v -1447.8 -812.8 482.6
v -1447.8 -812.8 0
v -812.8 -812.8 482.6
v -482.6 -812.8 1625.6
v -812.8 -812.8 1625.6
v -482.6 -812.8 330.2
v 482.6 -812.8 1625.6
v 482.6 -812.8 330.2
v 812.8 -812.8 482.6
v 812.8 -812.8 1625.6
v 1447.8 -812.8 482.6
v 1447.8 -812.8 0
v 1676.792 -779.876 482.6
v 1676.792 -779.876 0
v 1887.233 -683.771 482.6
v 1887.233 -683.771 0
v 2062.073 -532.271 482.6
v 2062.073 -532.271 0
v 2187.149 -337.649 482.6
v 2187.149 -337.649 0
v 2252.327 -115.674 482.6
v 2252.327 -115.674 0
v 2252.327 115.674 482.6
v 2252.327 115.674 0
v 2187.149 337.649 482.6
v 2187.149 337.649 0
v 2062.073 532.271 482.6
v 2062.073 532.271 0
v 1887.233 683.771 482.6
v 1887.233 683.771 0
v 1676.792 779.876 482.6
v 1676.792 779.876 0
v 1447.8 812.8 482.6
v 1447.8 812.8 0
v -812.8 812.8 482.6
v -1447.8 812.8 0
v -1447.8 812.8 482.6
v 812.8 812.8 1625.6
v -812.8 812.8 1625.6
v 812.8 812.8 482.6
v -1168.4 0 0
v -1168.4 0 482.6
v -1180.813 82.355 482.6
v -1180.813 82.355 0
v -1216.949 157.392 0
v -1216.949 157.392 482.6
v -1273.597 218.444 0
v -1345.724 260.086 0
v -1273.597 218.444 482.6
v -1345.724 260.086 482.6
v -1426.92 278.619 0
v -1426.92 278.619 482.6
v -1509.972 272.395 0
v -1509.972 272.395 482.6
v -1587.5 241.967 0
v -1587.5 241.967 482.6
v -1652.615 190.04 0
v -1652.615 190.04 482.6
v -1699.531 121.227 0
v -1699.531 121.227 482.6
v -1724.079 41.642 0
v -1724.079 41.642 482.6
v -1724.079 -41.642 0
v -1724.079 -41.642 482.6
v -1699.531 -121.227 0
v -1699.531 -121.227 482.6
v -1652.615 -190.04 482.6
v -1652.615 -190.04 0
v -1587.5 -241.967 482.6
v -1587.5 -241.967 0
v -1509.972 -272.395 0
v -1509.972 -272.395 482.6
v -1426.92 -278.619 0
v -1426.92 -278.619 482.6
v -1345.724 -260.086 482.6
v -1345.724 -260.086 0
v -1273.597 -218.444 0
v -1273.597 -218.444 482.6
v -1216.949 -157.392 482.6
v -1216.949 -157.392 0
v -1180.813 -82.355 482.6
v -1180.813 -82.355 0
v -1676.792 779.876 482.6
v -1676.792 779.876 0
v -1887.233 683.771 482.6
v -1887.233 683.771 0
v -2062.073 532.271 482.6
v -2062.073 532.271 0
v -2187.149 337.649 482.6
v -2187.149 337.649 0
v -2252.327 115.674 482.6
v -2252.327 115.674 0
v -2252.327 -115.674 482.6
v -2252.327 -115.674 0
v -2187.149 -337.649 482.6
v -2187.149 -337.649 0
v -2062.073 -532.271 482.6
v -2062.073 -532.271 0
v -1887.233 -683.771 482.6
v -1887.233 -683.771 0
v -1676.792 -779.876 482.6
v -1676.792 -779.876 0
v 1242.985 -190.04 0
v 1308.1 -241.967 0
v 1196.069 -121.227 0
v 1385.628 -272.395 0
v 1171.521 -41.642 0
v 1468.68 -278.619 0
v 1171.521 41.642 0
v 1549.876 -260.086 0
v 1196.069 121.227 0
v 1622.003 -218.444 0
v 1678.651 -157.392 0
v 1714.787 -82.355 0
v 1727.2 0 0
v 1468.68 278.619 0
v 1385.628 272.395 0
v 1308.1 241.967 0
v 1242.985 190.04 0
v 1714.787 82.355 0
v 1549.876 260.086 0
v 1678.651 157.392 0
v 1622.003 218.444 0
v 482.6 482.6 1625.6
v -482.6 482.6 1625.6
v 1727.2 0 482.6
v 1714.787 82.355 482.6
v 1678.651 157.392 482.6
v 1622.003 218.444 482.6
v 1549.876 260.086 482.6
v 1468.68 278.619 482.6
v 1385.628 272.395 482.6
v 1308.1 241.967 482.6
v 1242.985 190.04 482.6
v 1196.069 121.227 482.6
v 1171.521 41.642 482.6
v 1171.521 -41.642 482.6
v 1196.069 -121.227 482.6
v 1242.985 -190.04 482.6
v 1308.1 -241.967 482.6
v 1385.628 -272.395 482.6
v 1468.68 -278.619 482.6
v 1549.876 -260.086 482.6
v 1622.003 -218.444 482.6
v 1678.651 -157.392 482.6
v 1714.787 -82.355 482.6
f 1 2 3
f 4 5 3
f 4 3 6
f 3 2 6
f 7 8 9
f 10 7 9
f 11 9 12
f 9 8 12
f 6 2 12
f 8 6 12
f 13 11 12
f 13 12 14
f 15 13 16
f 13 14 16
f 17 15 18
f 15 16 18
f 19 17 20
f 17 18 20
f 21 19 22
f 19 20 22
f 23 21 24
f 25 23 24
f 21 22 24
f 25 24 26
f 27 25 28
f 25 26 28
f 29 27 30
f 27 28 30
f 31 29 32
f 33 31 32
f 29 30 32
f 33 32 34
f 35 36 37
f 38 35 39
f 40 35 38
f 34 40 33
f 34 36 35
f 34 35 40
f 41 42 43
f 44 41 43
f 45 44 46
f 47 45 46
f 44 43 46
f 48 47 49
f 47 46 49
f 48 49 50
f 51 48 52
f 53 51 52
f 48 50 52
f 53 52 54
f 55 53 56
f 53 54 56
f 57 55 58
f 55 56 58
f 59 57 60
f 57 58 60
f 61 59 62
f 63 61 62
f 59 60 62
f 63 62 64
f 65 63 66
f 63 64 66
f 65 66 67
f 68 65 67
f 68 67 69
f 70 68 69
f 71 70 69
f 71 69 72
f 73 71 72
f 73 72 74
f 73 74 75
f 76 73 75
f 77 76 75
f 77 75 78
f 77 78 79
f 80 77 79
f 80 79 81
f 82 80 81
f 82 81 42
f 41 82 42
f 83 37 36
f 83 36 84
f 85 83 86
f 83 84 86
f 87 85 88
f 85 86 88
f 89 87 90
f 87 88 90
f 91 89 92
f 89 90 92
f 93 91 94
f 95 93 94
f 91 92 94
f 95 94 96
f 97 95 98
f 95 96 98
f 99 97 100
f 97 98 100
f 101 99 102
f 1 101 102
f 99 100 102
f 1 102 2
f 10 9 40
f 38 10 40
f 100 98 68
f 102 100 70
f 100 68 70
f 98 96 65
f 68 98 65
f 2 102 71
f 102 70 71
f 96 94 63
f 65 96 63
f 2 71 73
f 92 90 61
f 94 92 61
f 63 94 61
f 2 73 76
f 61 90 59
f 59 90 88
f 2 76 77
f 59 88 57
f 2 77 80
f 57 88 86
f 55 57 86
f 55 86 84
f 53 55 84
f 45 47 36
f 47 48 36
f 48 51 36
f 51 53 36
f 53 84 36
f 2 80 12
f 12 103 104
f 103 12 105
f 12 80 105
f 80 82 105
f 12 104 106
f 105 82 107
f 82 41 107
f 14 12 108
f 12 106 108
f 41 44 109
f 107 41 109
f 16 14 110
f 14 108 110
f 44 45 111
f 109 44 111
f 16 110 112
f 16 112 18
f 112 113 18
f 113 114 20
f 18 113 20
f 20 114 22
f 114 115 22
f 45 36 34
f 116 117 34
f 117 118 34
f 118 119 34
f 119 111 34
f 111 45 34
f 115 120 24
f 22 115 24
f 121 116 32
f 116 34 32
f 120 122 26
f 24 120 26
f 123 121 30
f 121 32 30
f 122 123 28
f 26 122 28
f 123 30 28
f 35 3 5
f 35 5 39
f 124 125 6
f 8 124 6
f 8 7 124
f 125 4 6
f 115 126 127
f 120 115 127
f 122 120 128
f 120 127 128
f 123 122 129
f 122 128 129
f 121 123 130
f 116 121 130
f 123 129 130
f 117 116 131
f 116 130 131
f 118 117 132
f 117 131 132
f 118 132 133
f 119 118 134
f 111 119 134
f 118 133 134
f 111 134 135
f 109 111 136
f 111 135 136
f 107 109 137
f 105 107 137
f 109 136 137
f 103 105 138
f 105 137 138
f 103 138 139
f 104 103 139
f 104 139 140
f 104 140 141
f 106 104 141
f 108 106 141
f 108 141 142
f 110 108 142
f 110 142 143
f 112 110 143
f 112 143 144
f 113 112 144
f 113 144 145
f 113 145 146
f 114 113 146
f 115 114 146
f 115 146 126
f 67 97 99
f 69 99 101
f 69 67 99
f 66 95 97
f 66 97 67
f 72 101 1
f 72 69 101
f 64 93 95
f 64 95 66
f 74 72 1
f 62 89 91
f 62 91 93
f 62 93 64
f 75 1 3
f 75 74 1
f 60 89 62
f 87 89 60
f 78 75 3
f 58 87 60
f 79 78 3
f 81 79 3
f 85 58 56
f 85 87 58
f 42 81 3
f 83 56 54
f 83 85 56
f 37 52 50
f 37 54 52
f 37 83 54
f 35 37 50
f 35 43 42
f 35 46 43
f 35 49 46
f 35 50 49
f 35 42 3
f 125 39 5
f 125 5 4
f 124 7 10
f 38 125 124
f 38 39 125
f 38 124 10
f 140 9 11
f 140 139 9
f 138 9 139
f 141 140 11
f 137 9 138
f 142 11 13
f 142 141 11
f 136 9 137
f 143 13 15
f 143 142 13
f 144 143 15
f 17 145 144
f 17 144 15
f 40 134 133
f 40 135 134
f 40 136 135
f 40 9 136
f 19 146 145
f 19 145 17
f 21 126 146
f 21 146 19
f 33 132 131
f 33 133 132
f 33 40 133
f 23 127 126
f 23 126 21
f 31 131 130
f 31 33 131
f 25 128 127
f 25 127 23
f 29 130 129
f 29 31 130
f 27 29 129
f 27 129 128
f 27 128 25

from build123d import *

# Parameters (mm, degrees)
F0_W       = 2895.6
F0_H       = 1625.6
F1_DEPTH   = 482.6
F2_W       = 1625.6
F2_H       = 1625.6
F3_DEPTH   = 1143
F4_W       = 965.2
F4_H       = 1295.4
F5_DEPTH   = 1295.4
F7_DEPTH   = 965.2
F9_R       = 279.4
F10_DEPTH  = 7620
F8_R       = 279.4
F11_DEPTH  = 15240
F11_FACE_R = 279.4
F12_DEPTH  = 20320


with BuildPart() as f1:
    # F0 (on Top) → F1 (new body)
    with BuildSketch(Plane.XY):
        Rectangle(F0_W, F0_H)
        with BuildLine():
            Line((-1447.8, -812.8), (-1447.8, 812.8))
            ThreePointArc((-1447.8, 812.8), (-2260.6, 0), (-1447.8, -812.8))
        make_face()
        with BuildLine():
            ThreePointArc((1447.8, -812.8), (2260.6, 0), (1447.8, 812.8))
            Line((1447.8, 812.8), (1447.8, -812.8))
        make_face()
    extrude(amount=F1_DEPTH)

    # F2 (on face) → F3 (join)
    with BuildSketch(Plane.XY.offset(482.6)):
        Rectangle(F2_W, F2_H)
    extrude(amount=F3_DEPTH)

    # F4 (on face) → F5 (cut)
    with BuildSketch(Plane.XY.offset(1625.6)):
        with Locations((0, -165.1)):
            Rectangle(F4_W, F4_H)
    extrude(amount=-F5_DEPTH, mode=Mode.SUBTRACT)

    # F6 (on face) → F7 (join)
    with BuildSketch(Plane.YZ.offset(-482.6)):
        Polygon((482.6, 330.2), (482.6, 1625.6), (-812.8, 330.2), align=None)
    extrude(amount=F7_DEPTH)

    # F9 (on face) → F10 (cut)
    with BuildSketch(Plane.XY.offset(482.6)):
        with Locations((-1447.8, 0)):
            Circle(F9_R)
    extrude(amount=-F10_DEPTH, mode=Mode.SUBTRACT)

    # F8 (on face) → F11 (join)
    with BuildSketch(Plane.XY.offset(482.6)):
        with Locations((1447.8, 0)):
            Circle(F8_R)
    extrude(amount=F11_DEPTH)

    # F11_face (on face) → F12 (cut)
    with BuildSketch(Plane(origin=(1447.8, 0, 15722.6), x_dir=(1, 0, 0), z_dir=(0, 0, 1))):
        Circle(F11_FACE_R)
    extrude(amount=-F12_DEPTH, mode=Mode.SUBTRACT)


solid = f1.part
